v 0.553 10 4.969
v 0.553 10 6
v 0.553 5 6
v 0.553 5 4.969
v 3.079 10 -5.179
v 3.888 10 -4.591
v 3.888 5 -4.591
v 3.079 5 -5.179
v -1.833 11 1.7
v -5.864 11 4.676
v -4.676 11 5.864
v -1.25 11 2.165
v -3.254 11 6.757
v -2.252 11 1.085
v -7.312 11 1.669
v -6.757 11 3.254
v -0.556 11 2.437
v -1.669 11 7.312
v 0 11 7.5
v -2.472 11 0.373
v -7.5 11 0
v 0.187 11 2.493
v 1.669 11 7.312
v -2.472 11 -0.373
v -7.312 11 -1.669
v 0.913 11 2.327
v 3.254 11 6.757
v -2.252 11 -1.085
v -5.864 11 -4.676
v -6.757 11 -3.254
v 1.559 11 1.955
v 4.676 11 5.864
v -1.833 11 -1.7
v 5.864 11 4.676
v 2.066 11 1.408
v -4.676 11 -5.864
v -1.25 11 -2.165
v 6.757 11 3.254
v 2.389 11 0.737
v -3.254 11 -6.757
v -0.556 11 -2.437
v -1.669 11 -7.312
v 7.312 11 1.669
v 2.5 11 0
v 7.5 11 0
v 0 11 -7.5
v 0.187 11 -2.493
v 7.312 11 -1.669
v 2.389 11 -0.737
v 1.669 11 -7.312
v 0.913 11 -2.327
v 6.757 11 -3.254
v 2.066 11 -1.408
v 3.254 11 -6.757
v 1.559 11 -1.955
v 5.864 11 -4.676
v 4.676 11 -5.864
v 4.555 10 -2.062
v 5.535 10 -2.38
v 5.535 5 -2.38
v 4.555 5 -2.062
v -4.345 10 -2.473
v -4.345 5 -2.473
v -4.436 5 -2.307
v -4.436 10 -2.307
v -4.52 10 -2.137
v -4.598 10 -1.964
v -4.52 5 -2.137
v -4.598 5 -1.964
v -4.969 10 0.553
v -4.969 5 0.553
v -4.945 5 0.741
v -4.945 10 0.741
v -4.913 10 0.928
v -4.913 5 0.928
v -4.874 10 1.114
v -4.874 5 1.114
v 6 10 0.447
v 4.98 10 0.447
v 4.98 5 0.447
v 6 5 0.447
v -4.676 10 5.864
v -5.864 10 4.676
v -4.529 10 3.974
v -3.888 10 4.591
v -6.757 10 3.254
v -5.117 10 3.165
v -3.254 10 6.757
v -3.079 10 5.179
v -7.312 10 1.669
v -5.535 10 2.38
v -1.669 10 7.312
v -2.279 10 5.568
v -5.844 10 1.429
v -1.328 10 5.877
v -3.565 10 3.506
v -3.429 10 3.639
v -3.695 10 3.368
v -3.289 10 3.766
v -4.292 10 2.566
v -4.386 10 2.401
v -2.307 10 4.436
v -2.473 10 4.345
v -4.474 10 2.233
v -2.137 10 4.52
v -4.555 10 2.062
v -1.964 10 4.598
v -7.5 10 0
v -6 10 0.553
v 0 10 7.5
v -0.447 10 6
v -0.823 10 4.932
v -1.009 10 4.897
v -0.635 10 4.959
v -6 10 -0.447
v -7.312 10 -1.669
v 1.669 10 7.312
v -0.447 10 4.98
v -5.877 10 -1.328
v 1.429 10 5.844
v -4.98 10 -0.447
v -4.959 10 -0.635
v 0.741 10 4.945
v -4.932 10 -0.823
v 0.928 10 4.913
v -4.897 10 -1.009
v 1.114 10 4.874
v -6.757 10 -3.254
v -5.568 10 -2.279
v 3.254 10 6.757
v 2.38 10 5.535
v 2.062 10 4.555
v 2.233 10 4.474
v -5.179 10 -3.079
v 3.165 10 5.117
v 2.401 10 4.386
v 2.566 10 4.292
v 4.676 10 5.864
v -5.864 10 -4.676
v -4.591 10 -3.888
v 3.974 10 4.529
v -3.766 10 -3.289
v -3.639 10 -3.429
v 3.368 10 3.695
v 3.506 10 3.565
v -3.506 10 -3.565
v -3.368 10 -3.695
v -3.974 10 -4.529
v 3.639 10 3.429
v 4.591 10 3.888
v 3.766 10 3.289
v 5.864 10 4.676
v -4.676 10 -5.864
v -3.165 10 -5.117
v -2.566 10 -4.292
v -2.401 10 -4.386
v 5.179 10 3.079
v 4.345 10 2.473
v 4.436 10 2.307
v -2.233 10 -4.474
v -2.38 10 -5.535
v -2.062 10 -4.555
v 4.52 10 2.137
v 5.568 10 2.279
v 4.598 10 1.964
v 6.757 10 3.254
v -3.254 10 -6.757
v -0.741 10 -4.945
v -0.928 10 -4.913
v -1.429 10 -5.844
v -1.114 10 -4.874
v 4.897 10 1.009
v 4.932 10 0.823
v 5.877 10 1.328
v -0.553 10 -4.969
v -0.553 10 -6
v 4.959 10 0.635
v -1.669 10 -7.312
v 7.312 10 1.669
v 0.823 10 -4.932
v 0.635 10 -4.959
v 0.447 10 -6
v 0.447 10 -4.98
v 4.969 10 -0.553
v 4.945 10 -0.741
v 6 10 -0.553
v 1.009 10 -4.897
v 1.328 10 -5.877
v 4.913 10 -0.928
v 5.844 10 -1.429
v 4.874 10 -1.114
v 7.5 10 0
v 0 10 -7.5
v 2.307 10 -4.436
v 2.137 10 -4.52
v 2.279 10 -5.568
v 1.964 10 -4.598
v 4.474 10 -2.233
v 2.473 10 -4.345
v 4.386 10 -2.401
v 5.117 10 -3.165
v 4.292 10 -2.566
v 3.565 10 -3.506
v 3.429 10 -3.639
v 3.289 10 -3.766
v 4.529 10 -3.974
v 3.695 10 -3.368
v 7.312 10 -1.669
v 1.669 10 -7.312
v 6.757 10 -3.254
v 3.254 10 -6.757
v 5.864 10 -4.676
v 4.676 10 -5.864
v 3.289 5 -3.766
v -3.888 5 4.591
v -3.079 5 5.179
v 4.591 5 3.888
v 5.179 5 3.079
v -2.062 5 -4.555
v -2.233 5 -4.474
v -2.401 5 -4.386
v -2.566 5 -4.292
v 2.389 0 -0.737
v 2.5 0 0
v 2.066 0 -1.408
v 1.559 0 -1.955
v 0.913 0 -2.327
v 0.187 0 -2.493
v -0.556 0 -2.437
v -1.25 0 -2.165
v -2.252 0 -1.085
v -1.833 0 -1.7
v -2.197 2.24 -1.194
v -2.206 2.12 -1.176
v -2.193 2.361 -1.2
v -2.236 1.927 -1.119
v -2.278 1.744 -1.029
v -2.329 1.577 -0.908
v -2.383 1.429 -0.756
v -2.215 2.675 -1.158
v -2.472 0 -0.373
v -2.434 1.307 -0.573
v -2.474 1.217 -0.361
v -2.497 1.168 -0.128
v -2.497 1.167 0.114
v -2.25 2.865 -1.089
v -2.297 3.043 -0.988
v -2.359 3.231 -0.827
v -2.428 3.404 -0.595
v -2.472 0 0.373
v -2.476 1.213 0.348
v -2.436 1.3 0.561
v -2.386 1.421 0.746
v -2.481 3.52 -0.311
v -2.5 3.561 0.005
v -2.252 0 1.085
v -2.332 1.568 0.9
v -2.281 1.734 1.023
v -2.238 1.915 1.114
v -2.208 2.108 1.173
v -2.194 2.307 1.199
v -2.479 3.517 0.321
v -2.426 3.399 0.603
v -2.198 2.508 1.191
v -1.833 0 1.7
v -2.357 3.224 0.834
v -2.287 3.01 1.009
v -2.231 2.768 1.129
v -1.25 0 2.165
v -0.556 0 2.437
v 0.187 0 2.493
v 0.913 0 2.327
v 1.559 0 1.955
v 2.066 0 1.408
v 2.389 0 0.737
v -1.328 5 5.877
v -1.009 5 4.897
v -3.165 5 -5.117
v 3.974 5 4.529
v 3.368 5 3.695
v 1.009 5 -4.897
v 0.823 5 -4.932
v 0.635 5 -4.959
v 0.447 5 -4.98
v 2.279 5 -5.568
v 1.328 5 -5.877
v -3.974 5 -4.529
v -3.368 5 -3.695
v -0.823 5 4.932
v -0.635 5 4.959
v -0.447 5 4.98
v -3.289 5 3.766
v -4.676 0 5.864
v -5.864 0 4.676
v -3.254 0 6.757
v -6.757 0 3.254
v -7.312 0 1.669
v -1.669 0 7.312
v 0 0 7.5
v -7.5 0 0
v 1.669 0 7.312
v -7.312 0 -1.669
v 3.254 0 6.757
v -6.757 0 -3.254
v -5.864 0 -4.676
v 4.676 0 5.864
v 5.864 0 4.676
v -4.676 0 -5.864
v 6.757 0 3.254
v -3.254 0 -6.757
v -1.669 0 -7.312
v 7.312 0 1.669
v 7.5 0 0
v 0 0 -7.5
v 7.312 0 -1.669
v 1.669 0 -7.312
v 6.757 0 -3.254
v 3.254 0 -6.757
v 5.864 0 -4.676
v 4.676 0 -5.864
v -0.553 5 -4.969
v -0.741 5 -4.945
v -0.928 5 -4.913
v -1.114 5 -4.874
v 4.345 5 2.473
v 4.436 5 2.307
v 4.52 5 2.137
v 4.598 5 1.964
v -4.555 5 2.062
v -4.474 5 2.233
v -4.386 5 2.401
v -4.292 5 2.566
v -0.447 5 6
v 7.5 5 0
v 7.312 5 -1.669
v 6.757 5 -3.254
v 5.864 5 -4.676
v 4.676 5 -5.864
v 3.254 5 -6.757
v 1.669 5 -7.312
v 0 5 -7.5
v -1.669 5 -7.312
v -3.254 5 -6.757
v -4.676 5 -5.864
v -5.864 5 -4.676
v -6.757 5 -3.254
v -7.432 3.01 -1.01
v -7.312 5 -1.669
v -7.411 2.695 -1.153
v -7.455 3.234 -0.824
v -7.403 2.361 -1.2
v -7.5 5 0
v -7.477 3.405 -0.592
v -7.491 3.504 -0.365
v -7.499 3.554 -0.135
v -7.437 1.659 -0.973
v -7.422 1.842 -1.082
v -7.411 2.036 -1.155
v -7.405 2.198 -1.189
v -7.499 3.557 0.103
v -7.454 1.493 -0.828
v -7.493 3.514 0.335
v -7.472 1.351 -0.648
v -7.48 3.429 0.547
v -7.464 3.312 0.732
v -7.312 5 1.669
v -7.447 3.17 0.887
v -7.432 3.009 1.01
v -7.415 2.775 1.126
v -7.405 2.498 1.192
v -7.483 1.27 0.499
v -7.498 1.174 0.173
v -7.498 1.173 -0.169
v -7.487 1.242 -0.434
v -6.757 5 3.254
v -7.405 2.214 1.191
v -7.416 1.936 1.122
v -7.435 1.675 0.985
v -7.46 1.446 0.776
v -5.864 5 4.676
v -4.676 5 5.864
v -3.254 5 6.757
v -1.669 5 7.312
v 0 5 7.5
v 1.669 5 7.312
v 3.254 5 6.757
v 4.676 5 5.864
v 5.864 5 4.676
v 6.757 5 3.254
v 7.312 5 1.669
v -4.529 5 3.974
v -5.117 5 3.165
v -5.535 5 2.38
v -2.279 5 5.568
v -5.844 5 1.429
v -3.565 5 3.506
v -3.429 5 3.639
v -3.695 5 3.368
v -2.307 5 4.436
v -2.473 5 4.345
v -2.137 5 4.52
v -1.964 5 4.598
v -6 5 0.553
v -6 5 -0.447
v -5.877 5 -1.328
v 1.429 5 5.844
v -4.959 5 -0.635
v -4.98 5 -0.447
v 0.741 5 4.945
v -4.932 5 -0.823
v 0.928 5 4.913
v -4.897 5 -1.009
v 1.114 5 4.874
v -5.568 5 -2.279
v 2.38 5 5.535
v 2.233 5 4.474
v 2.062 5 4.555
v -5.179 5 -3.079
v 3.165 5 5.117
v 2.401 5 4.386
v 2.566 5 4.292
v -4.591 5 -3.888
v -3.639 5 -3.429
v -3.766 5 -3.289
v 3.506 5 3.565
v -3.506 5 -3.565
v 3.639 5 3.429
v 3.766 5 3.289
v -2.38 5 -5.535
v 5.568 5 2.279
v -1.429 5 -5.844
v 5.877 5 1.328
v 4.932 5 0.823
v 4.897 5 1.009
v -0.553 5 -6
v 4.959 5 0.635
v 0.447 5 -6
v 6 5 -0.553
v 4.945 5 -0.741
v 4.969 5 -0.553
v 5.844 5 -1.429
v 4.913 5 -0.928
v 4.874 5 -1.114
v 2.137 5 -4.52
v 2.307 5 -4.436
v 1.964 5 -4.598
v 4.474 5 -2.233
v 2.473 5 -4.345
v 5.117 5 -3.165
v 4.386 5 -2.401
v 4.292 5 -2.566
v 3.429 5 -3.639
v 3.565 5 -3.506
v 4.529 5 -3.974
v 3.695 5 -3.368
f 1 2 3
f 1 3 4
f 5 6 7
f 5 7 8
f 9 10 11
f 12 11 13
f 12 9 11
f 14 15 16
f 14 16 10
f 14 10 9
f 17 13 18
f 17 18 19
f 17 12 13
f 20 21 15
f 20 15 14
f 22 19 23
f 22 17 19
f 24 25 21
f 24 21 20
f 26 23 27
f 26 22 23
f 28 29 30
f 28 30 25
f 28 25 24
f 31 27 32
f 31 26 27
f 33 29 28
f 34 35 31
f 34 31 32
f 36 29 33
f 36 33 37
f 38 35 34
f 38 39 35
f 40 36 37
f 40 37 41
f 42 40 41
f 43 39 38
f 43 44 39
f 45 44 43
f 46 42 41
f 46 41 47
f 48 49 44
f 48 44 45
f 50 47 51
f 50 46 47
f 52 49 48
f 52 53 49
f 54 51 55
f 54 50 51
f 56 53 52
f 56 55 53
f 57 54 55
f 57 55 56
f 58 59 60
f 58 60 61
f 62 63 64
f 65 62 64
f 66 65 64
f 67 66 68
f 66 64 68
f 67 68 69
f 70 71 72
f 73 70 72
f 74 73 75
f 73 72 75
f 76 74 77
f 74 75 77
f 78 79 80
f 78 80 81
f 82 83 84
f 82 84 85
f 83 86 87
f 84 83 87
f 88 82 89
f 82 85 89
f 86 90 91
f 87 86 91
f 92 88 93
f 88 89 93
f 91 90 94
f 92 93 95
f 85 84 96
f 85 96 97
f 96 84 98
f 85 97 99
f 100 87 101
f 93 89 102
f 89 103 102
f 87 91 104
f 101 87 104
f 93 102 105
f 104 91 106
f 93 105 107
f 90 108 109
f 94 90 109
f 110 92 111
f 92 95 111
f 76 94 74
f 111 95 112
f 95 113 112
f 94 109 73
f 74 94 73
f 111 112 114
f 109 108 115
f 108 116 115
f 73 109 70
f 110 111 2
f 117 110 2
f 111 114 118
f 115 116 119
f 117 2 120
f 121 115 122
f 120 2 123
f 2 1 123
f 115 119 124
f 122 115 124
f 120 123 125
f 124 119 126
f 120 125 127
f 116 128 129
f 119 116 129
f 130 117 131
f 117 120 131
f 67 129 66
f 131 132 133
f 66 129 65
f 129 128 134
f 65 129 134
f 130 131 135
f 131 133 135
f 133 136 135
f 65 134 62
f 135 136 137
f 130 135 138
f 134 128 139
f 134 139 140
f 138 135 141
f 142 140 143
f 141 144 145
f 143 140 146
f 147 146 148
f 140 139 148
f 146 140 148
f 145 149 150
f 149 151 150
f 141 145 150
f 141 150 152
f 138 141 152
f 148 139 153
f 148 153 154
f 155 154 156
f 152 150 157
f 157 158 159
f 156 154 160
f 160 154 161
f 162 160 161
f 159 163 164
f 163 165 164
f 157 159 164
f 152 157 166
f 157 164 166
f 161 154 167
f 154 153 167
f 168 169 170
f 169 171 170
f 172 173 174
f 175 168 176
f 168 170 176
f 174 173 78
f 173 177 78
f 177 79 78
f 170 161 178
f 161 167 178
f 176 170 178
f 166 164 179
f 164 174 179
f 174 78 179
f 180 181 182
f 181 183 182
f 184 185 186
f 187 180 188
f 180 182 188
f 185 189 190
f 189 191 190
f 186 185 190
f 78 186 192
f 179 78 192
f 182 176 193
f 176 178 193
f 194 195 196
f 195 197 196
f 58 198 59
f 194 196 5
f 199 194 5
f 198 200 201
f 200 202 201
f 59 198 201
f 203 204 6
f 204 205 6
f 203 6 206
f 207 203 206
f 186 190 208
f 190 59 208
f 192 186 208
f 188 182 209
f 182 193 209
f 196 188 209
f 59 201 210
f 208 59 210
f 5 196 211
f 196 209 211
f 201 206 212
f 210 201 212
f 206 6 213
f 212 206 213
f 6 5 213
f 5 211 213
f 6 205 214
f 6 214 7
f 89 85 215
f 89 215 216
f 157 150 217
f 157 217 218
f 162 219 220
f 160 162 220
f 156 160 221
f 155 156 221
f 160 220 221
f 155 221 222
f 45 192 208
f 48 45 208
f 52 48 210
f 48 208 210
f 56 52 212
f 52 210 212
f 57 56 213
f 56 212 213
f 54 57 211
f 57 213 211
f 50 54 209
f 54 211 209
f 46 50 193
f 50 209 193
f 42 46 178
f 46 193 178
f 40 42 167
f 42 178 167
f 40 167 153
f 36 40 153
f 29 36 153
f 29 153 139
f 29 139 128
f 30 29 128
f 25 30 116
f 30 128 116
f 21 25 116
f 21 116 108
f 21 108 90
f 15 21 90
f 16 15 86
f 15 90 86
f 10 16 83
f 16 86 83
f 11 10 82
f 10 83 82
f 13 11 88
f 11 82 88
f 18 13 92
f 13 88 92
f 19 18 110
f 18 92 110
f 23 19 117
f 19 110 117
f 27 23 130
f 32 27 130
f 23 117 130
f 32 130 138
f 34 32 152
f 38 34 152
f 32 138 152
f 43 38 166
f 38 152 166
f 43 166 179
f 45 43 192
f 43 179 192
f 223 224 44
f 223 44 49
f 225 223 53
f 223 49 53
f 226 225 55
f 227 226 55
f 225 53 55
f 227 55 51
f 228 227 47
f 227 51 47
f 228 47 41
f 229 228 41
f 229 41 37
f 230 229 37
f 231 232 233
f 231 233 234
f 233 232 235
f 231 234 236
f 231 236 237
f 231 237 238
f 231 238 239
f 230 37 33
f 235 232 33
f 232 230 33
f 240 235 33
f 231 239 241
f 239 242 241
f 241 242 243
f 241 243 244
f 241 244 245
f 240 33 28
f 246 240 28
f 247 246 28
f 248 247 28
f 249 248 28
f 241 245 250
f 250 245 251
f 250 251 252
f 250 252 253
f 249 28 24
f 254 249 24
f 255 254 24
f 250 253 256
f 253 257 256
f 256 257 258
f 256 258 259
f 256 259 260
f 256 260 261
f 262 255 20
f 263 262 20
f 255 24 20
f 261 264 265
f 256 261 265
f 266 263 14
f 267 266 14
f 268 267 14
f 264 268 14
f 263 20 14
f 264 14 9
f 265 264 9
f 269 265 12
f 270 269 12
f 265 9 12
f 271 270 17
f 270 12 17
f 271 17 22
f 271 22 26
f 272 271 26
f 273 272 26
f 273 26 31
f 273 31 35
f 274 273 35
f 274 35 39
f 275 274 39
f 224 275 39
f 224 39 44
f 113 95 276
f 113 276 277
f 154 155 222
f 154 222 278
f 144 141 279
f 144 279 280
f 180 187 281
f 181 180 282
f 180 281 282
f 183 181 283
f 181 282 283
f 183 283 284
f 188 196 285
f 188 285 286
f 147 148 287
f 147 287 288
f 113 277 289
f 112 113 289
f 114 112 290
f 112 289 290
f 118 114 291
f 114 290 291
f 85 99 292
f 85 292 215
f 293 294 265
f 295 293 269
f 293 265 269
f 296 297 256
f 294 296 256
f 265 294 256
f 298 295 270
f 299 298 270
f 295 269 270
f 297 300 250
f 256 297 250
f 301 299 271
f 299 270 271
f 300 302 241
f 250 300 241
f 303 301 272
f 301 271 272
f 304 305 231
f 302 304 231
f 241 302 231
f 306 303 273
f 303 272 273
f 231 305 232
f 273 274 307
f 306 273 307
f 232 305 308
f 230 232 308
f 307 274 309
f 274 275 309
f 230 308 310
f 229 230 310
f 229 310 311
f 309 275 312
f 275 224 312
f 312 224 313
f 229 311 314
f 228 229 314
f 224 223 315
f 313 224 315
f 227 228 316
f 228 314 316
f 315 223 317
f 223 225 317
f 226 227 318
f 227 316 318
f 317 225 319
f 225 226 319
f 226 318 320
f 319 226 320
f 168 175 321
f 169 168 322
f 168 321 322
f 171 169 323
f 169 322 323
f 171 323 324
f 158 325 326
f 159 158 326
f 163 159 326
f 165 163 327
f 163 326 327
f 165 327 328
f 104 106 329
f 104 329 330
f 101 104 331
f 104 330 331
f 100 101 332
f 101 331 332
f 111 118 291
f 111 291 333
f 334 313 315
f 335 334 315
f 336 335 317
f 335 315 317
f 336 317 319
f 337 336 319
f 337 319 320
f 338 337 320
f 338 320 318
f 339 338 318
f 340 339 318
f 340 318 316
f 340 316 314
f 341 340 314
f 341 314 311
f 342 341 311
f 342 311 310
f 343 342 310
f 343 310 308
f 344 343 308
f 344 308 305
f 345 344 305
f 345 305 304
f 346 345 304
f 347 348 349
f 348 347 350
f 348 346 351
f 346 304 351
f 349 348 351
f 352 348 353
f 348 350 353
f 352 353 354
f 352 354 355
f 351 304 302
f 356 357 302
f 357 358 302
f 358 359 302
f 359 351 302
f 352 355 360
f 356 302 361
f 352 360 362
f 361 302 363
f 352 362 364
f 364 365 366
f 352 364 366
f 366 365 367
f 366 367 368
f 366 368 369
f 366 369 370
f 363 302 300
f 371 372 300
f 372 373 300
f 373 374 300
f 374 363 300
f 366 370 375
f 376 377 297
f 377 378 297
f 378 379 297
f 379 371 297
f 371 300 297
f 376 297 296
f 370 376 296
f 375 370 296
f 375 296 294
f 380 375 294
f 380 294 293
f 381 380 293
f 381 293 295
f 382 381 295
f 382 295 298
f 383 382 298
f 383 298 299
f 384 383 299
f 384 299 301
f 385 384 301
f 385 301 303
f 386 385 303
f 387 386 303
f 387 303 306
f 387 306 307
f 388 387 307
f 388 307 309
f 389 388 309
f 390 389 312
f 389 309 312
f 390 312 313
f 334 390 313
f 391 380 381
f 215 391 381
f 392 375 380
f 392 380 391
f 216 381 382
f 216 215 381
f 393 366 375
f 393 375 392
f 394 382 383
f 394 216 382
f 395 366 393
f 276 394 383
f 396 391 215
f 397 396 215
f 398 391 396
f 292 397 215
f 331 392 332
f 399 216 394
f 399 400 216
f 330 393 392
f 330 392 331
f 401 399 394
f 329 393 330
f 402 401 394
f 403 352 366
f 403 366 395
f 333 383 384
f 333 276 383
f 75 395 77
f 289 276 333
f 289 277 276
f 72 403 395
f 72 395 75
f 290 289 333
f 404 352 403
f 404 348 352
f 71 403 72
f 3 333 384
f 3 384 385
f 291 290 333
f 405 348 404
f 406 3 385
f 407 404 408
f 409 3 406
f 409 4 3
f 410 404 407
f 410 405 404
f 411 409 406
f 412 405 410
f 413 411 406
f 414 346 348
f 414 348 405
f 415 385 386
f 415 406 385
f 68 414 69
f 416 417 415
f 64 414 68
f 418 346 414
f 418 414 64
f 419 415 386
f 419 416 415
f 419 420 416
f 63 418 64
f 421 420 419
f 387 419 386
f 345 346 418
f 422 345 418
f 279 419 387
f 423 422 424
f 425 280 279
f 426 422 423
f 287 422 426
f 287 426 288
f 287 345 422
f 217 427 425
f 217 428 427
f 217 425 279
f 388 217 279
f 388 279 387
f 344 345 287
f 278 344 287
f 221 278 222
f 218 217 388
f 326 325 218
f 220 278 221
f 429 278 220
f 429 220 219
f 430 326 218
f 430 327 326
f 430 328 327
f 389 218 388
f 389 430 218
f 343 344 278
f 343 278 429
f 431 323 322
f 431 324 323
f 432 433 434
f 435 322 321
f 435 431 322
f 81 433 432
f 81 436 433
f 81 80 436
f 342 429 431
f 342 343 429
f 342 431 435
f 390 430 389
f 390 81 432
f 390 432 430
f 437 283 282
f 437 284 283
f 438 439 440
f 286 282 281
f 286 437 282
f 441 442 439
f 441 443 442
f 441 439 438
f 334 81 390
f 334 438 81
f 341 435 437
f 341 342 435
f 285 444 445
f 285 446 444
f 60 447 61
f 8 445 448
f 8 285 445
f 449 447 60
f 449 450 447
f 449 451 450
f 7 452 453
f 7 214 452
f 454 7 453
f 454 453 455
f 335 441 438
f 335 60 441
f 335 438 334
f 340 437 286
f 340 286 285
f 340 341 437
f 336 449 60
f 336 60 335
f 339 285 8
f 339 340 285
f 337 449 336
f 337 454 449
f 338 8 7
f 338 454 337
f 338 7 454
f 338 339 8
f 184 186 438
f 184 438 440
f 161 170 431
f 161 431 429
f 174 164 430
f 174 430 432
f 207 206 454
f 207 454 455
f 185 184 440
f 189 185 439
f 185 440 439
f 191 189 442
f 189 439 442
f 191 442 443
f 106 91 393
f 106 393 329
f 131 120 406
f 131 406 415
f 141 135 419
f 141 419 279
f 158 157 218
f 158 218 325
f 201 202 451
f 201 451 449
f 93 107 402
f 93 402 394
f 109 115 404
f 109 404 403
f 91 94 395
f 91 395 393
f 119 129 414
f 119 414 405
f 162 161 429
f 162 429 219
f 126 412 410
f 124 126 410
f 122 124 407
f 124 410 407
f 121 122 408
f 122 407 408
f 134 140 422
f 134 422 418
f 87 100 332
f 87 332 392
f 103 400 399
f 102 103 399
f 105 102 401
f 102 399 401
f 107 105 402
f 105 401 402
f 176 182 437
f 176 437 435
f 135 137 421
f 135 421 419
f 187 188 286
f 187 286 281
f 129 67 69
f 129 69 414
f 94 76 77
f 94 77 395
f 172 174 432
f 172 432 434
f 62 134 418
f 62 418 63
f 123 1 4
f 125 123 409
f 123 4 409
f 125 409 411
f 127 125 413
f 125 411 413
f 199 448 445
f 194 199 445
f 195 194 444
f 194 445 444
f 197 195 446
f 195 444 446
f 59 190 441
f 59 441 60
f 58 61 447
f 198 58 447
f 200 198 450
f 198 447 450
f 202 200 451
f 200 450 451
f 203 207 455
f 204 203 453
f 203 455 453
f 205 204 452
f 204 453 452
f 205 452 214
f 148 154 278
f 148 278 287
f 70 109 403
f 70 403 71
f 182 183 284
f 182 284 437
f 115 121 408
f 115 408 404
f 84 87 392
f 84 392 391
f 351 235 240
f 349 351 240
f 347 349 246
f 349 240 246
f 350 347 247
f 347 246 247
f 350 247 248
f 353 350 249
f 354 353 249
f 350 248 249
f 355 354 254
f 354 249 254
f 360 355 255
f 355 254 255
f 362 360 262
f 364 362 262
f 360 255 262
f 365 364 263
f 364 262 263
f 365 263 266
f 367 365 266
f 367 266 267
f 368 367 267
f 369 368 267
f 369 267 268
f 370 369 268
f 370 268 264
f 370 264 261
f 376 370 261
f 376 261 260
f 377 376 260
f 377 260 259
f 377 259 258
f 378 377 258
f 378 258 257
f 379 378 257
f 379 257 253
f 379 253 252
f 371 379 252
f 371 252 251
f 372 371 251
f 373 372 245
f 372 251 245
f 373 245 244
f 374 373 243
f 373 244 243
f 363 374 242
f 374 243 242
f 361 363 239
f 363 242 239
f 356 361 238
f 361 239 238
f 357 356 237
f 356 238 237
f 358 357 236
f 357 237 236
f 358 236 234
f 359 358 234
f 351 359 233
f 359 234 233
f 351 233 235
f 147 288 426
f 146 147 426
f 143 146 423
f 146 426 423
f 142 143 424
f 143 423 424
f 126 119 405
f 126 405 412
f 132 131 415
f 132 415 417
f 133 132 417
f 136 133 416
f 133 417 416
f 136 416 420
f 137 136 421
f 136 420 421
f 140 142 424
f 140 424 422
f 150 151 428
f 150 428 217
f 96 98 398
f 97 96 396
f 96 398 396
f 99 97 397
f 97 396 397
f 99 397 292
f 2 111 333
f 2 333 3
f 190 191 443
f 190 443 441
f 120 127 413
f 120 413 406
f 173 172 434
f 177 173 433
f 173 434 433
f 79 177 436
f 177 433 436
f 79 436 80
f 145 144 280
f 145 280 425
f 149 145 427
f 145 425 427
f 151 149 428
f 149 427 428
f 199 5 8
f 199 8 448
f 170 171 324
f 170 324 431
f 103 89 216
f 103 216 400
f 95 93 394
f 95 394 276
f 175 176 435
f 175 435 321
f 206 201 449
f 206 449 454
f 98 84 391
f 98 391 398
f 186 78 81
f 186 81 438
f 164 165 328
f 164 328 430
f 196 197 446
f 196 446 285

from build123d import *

# Parameters (mm, degrees)
IZIM1_R                     = 7.5
Y_KSEKLIK_EKSTR_ZYON1_DEPTH = 5
IZIM6_R                     = 5
Y_KSEKLIK_EKSTR_ZYON5_DEPTH = 5
Y_KSEKLIK_EKSTR_ZYON6_DEPTH = 7
DAIRESEL_KAPLAMA2_COUNT     = 20
IZIM8_R                     = 7.5
Y_KSEKLIK_EKSTR_ZYON7_DEPTH = 1
IZIM9_R                     = 2.5
KES_EKSTR_ZYON2_DEPTH       = 21
IZIM10_R                    = 1.2
KES_EKSTR_ZYON3_DEPTH       = 21


with BuildPart() as part:
    # Çizim1 → Yükseklik-Ekstrüzyon1 (new body)
    with BuildSketch(Plane(origin=(0, 0, 0), x_dir=(1, 0, 0), z_dir=(0, 1, 0))):
        Circle(IZIM1_R)
    extrude(amount=Y_KSEKLIK_EKSTR_ZYON1_DEPTH)

    # Çizim6 → Yükseklik-Ekstrüzyon5 (add)
    with BuildSketch(Plane(origin=(0, 5, 0), x_dir=(1, 0, 0), z_dir=(0, 1, 0))):
        Circle(IZIM6_R)
    extrude(amount=Y_KSEKLIK_EKSTR_ZYON5_DEPTH)

    # Çizim7 → Yükseklik-Ekstrüzyon6 (add)
    with BuildSketch(Plane(origin=(0, 10, 0), x_dir=(1, 0, 0), z_dir=(0, 1, 0))):
        with BuildLine():
            Line((0, 6), (0, 5))
            ThreePointArc((0, 5), (0.223628846, 4.99499651), (0.446810123, 4.979996056))
            Line((0.446810123, 4.979996056), (0.446810123, 6))
            Line((0.446810123, 6), (0, 6))
        make_face()
        with BuildLine():
            ThreePointArc((-0.553189877, 4.969303871), (-0.277020438, 4.99232007), (0, 5))
            Line((0, 5), (0, 6))
            Line((0, 6), (-0.553189877, 6))
            Line((-0.553189877, 6), (-0.553189877, 4.969303871))
        make_face()
    y_kseklik_ekstr_zyon6 = extrude(amount=-Y_KSEKLIK_EKSTR_ZYON6_DEPTH)

    # Dairesel Kaplama2: Yükseklik-Ekstrüzyon6 ×20 about axis
    dairesel_kaplama2_axis = Axis((0, 0, 0), (0, 1, 0))
    for i in range(1, DAIRESEL_KAPLAMA2_COUNT):
        add(y_kseklik_ekstr_zyon6.rotate(dairesel_kaplama2_axis, i * 360 / DAIRESEL_KAPLAMA2_COUNT))

    # Çizim8 → Yükseklik-Ekstrüzyon7 (add)
    with BuildSketch(Plane(origin=(0, 10, 0), x_dir=(1, 0, 0), z_dir=(0, 1, 0))):
        Circle(IZIM8_R)
    extrude(amount=Y_KSEKLIK_EKSTR_ZYON7_DEPTH)

    # Çizim9 → Kes-Ekstrüzyon2 (cut)
    with BuildSketch(Plane(origin=(0, 11, 0), x_dir=(1, 0, 0), z_dir=(0, 1, 0))):
        Circle(IZIM9_R)
    extrude(amount=-KES_EKSTR_ZYON2_DEPTH, mode=Mode.SUBTRACT)

    # Çizim10 → Kes-Ekstrüzyon3 (cut)
    with BuildSketch(Plane(origin=(0, 0, 0), x_dir=(0, 0, -1), z_dir=(1, 0, 0))):
        with Locations((0, 2.361227205)):
            Circle(IZIM10_R)
    extrude(amount=-KES_EKSTR_ZYON3_DEPTH, mode=Mode.SUBTRACT)


solid = part.part
